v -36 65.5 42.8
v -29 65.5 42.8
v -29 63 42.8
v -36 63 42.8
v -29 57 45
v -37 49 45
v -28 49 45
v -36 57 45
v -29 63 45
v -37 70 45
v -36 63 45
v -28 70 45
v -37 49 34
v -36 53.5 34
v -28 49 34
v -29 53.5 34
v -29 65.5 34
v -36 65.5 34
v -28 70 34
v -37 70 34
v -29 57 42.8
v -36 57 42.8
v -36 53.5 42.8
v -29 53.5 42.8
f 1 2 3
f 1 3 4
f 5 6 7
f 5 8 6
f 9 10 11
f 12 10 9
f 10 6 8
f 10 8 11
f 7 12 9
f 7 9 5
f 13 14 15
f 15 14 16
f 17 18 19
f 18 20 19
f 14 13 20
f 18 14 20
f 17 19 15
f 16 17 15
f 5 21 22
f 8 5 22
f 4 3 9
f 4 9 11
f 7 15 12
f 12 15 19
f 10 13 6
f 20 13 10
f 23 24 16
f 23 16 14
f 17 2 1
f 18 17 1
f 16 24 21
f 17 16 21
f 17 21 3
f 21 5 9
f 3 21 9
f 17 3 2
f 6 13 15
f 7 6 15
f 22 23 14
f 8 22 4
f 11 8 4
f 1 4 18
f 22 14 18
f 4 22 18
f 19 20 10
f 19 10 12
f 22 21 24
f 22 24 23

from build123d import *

# Parameters (mm, degrees)
BOX049_W                     = 6
BOX049_H                     = 7
BOX049_DEPTH                 = 8
BOX048_W                     = 7
BOX048_H                     = 12
BOX048_DEPTH                 = 10
CHAMFER001_SIZE              = 1
CHAMFER001_PLACEMENT_ANGLE   = 90
FUSION002028_PLACEMENT_ANGLE = 90
BOX047_W                     = 9
BOX047_H                     = 21
BOX047_DEPTH                 = 11


with BuildPart() as cubo049:
    # Box049 → Box049 (new body)
    with BuildSketch(Plane(origin=(-9.5, -15, 2.5), x_dir=(1, 0, 0), z_dir=(0, 0, 1))):
        with Locations((3, 3.5)):
            Rectangle(BOX049_W, BOX049_H)
    extrude(amount=BOX049_DEPTH)


with BuildPart() as fusion002028:
    # Box048 → Box048 (new body)
    with BuildSketch(Plane(origin=(-13, -7, 7.5), x_dir=(1, 0, 0), z_dir=(0, 0, -1))):
        with Locations((3.5, 6)):
            Rectangle(BOX048_W, BOX048_H)
    extrude(amount=BOX048_DEPTH)

    # Chamfer001
    chamfer001_edges = [fusion002028.edges().sort_by_distance(p)[0] for p in [
        (-13, -13, -2.5),
    ]]
    chamfer(chamfer001_edges, length=CHAMFER001_SIZE)


with BuildPart() as fusion002028_1:
    # Chamfer001 placement: moved
    add(fusion002028.part.moved(Location((-20, -2, 0.5))).rotate(Axis((-20, -2, 0.5), (0, 0, 1)), CHAMFER001_PLACEMENT_ANGLE))

    # Fusion002028: union Cubo049
    add(cubo049.part)


with BuildPart() as fusion002028_2:
    # Fusion002028 placement: moved
    add(fusion002028_1.part.moved(Location((-44, 66.5, 34.8))).rotate(Axis((-44, 66.5, 34.8), (0, 0, 1)), FUSION002028_PLACEMENT_ANGLE))


with BuildPart() as cut072:
    # Box047 → Box047 (new body)
    with BuildSketch(Plane(origin=(-37, 49, 34), x_dir=(1, 0, 0), z_dir=(0, 0, 1))):
        with Locations((4.5, 10.5)):
            Rectangle(BOX047_W, BOX047_H)
    extrude(amount=BOX047_DEPTH)

    # Cut072: cut Fusion002028
    add(fusion002028_2.part, mode=Mode.SUBTRACT)


solid = cut072.part
